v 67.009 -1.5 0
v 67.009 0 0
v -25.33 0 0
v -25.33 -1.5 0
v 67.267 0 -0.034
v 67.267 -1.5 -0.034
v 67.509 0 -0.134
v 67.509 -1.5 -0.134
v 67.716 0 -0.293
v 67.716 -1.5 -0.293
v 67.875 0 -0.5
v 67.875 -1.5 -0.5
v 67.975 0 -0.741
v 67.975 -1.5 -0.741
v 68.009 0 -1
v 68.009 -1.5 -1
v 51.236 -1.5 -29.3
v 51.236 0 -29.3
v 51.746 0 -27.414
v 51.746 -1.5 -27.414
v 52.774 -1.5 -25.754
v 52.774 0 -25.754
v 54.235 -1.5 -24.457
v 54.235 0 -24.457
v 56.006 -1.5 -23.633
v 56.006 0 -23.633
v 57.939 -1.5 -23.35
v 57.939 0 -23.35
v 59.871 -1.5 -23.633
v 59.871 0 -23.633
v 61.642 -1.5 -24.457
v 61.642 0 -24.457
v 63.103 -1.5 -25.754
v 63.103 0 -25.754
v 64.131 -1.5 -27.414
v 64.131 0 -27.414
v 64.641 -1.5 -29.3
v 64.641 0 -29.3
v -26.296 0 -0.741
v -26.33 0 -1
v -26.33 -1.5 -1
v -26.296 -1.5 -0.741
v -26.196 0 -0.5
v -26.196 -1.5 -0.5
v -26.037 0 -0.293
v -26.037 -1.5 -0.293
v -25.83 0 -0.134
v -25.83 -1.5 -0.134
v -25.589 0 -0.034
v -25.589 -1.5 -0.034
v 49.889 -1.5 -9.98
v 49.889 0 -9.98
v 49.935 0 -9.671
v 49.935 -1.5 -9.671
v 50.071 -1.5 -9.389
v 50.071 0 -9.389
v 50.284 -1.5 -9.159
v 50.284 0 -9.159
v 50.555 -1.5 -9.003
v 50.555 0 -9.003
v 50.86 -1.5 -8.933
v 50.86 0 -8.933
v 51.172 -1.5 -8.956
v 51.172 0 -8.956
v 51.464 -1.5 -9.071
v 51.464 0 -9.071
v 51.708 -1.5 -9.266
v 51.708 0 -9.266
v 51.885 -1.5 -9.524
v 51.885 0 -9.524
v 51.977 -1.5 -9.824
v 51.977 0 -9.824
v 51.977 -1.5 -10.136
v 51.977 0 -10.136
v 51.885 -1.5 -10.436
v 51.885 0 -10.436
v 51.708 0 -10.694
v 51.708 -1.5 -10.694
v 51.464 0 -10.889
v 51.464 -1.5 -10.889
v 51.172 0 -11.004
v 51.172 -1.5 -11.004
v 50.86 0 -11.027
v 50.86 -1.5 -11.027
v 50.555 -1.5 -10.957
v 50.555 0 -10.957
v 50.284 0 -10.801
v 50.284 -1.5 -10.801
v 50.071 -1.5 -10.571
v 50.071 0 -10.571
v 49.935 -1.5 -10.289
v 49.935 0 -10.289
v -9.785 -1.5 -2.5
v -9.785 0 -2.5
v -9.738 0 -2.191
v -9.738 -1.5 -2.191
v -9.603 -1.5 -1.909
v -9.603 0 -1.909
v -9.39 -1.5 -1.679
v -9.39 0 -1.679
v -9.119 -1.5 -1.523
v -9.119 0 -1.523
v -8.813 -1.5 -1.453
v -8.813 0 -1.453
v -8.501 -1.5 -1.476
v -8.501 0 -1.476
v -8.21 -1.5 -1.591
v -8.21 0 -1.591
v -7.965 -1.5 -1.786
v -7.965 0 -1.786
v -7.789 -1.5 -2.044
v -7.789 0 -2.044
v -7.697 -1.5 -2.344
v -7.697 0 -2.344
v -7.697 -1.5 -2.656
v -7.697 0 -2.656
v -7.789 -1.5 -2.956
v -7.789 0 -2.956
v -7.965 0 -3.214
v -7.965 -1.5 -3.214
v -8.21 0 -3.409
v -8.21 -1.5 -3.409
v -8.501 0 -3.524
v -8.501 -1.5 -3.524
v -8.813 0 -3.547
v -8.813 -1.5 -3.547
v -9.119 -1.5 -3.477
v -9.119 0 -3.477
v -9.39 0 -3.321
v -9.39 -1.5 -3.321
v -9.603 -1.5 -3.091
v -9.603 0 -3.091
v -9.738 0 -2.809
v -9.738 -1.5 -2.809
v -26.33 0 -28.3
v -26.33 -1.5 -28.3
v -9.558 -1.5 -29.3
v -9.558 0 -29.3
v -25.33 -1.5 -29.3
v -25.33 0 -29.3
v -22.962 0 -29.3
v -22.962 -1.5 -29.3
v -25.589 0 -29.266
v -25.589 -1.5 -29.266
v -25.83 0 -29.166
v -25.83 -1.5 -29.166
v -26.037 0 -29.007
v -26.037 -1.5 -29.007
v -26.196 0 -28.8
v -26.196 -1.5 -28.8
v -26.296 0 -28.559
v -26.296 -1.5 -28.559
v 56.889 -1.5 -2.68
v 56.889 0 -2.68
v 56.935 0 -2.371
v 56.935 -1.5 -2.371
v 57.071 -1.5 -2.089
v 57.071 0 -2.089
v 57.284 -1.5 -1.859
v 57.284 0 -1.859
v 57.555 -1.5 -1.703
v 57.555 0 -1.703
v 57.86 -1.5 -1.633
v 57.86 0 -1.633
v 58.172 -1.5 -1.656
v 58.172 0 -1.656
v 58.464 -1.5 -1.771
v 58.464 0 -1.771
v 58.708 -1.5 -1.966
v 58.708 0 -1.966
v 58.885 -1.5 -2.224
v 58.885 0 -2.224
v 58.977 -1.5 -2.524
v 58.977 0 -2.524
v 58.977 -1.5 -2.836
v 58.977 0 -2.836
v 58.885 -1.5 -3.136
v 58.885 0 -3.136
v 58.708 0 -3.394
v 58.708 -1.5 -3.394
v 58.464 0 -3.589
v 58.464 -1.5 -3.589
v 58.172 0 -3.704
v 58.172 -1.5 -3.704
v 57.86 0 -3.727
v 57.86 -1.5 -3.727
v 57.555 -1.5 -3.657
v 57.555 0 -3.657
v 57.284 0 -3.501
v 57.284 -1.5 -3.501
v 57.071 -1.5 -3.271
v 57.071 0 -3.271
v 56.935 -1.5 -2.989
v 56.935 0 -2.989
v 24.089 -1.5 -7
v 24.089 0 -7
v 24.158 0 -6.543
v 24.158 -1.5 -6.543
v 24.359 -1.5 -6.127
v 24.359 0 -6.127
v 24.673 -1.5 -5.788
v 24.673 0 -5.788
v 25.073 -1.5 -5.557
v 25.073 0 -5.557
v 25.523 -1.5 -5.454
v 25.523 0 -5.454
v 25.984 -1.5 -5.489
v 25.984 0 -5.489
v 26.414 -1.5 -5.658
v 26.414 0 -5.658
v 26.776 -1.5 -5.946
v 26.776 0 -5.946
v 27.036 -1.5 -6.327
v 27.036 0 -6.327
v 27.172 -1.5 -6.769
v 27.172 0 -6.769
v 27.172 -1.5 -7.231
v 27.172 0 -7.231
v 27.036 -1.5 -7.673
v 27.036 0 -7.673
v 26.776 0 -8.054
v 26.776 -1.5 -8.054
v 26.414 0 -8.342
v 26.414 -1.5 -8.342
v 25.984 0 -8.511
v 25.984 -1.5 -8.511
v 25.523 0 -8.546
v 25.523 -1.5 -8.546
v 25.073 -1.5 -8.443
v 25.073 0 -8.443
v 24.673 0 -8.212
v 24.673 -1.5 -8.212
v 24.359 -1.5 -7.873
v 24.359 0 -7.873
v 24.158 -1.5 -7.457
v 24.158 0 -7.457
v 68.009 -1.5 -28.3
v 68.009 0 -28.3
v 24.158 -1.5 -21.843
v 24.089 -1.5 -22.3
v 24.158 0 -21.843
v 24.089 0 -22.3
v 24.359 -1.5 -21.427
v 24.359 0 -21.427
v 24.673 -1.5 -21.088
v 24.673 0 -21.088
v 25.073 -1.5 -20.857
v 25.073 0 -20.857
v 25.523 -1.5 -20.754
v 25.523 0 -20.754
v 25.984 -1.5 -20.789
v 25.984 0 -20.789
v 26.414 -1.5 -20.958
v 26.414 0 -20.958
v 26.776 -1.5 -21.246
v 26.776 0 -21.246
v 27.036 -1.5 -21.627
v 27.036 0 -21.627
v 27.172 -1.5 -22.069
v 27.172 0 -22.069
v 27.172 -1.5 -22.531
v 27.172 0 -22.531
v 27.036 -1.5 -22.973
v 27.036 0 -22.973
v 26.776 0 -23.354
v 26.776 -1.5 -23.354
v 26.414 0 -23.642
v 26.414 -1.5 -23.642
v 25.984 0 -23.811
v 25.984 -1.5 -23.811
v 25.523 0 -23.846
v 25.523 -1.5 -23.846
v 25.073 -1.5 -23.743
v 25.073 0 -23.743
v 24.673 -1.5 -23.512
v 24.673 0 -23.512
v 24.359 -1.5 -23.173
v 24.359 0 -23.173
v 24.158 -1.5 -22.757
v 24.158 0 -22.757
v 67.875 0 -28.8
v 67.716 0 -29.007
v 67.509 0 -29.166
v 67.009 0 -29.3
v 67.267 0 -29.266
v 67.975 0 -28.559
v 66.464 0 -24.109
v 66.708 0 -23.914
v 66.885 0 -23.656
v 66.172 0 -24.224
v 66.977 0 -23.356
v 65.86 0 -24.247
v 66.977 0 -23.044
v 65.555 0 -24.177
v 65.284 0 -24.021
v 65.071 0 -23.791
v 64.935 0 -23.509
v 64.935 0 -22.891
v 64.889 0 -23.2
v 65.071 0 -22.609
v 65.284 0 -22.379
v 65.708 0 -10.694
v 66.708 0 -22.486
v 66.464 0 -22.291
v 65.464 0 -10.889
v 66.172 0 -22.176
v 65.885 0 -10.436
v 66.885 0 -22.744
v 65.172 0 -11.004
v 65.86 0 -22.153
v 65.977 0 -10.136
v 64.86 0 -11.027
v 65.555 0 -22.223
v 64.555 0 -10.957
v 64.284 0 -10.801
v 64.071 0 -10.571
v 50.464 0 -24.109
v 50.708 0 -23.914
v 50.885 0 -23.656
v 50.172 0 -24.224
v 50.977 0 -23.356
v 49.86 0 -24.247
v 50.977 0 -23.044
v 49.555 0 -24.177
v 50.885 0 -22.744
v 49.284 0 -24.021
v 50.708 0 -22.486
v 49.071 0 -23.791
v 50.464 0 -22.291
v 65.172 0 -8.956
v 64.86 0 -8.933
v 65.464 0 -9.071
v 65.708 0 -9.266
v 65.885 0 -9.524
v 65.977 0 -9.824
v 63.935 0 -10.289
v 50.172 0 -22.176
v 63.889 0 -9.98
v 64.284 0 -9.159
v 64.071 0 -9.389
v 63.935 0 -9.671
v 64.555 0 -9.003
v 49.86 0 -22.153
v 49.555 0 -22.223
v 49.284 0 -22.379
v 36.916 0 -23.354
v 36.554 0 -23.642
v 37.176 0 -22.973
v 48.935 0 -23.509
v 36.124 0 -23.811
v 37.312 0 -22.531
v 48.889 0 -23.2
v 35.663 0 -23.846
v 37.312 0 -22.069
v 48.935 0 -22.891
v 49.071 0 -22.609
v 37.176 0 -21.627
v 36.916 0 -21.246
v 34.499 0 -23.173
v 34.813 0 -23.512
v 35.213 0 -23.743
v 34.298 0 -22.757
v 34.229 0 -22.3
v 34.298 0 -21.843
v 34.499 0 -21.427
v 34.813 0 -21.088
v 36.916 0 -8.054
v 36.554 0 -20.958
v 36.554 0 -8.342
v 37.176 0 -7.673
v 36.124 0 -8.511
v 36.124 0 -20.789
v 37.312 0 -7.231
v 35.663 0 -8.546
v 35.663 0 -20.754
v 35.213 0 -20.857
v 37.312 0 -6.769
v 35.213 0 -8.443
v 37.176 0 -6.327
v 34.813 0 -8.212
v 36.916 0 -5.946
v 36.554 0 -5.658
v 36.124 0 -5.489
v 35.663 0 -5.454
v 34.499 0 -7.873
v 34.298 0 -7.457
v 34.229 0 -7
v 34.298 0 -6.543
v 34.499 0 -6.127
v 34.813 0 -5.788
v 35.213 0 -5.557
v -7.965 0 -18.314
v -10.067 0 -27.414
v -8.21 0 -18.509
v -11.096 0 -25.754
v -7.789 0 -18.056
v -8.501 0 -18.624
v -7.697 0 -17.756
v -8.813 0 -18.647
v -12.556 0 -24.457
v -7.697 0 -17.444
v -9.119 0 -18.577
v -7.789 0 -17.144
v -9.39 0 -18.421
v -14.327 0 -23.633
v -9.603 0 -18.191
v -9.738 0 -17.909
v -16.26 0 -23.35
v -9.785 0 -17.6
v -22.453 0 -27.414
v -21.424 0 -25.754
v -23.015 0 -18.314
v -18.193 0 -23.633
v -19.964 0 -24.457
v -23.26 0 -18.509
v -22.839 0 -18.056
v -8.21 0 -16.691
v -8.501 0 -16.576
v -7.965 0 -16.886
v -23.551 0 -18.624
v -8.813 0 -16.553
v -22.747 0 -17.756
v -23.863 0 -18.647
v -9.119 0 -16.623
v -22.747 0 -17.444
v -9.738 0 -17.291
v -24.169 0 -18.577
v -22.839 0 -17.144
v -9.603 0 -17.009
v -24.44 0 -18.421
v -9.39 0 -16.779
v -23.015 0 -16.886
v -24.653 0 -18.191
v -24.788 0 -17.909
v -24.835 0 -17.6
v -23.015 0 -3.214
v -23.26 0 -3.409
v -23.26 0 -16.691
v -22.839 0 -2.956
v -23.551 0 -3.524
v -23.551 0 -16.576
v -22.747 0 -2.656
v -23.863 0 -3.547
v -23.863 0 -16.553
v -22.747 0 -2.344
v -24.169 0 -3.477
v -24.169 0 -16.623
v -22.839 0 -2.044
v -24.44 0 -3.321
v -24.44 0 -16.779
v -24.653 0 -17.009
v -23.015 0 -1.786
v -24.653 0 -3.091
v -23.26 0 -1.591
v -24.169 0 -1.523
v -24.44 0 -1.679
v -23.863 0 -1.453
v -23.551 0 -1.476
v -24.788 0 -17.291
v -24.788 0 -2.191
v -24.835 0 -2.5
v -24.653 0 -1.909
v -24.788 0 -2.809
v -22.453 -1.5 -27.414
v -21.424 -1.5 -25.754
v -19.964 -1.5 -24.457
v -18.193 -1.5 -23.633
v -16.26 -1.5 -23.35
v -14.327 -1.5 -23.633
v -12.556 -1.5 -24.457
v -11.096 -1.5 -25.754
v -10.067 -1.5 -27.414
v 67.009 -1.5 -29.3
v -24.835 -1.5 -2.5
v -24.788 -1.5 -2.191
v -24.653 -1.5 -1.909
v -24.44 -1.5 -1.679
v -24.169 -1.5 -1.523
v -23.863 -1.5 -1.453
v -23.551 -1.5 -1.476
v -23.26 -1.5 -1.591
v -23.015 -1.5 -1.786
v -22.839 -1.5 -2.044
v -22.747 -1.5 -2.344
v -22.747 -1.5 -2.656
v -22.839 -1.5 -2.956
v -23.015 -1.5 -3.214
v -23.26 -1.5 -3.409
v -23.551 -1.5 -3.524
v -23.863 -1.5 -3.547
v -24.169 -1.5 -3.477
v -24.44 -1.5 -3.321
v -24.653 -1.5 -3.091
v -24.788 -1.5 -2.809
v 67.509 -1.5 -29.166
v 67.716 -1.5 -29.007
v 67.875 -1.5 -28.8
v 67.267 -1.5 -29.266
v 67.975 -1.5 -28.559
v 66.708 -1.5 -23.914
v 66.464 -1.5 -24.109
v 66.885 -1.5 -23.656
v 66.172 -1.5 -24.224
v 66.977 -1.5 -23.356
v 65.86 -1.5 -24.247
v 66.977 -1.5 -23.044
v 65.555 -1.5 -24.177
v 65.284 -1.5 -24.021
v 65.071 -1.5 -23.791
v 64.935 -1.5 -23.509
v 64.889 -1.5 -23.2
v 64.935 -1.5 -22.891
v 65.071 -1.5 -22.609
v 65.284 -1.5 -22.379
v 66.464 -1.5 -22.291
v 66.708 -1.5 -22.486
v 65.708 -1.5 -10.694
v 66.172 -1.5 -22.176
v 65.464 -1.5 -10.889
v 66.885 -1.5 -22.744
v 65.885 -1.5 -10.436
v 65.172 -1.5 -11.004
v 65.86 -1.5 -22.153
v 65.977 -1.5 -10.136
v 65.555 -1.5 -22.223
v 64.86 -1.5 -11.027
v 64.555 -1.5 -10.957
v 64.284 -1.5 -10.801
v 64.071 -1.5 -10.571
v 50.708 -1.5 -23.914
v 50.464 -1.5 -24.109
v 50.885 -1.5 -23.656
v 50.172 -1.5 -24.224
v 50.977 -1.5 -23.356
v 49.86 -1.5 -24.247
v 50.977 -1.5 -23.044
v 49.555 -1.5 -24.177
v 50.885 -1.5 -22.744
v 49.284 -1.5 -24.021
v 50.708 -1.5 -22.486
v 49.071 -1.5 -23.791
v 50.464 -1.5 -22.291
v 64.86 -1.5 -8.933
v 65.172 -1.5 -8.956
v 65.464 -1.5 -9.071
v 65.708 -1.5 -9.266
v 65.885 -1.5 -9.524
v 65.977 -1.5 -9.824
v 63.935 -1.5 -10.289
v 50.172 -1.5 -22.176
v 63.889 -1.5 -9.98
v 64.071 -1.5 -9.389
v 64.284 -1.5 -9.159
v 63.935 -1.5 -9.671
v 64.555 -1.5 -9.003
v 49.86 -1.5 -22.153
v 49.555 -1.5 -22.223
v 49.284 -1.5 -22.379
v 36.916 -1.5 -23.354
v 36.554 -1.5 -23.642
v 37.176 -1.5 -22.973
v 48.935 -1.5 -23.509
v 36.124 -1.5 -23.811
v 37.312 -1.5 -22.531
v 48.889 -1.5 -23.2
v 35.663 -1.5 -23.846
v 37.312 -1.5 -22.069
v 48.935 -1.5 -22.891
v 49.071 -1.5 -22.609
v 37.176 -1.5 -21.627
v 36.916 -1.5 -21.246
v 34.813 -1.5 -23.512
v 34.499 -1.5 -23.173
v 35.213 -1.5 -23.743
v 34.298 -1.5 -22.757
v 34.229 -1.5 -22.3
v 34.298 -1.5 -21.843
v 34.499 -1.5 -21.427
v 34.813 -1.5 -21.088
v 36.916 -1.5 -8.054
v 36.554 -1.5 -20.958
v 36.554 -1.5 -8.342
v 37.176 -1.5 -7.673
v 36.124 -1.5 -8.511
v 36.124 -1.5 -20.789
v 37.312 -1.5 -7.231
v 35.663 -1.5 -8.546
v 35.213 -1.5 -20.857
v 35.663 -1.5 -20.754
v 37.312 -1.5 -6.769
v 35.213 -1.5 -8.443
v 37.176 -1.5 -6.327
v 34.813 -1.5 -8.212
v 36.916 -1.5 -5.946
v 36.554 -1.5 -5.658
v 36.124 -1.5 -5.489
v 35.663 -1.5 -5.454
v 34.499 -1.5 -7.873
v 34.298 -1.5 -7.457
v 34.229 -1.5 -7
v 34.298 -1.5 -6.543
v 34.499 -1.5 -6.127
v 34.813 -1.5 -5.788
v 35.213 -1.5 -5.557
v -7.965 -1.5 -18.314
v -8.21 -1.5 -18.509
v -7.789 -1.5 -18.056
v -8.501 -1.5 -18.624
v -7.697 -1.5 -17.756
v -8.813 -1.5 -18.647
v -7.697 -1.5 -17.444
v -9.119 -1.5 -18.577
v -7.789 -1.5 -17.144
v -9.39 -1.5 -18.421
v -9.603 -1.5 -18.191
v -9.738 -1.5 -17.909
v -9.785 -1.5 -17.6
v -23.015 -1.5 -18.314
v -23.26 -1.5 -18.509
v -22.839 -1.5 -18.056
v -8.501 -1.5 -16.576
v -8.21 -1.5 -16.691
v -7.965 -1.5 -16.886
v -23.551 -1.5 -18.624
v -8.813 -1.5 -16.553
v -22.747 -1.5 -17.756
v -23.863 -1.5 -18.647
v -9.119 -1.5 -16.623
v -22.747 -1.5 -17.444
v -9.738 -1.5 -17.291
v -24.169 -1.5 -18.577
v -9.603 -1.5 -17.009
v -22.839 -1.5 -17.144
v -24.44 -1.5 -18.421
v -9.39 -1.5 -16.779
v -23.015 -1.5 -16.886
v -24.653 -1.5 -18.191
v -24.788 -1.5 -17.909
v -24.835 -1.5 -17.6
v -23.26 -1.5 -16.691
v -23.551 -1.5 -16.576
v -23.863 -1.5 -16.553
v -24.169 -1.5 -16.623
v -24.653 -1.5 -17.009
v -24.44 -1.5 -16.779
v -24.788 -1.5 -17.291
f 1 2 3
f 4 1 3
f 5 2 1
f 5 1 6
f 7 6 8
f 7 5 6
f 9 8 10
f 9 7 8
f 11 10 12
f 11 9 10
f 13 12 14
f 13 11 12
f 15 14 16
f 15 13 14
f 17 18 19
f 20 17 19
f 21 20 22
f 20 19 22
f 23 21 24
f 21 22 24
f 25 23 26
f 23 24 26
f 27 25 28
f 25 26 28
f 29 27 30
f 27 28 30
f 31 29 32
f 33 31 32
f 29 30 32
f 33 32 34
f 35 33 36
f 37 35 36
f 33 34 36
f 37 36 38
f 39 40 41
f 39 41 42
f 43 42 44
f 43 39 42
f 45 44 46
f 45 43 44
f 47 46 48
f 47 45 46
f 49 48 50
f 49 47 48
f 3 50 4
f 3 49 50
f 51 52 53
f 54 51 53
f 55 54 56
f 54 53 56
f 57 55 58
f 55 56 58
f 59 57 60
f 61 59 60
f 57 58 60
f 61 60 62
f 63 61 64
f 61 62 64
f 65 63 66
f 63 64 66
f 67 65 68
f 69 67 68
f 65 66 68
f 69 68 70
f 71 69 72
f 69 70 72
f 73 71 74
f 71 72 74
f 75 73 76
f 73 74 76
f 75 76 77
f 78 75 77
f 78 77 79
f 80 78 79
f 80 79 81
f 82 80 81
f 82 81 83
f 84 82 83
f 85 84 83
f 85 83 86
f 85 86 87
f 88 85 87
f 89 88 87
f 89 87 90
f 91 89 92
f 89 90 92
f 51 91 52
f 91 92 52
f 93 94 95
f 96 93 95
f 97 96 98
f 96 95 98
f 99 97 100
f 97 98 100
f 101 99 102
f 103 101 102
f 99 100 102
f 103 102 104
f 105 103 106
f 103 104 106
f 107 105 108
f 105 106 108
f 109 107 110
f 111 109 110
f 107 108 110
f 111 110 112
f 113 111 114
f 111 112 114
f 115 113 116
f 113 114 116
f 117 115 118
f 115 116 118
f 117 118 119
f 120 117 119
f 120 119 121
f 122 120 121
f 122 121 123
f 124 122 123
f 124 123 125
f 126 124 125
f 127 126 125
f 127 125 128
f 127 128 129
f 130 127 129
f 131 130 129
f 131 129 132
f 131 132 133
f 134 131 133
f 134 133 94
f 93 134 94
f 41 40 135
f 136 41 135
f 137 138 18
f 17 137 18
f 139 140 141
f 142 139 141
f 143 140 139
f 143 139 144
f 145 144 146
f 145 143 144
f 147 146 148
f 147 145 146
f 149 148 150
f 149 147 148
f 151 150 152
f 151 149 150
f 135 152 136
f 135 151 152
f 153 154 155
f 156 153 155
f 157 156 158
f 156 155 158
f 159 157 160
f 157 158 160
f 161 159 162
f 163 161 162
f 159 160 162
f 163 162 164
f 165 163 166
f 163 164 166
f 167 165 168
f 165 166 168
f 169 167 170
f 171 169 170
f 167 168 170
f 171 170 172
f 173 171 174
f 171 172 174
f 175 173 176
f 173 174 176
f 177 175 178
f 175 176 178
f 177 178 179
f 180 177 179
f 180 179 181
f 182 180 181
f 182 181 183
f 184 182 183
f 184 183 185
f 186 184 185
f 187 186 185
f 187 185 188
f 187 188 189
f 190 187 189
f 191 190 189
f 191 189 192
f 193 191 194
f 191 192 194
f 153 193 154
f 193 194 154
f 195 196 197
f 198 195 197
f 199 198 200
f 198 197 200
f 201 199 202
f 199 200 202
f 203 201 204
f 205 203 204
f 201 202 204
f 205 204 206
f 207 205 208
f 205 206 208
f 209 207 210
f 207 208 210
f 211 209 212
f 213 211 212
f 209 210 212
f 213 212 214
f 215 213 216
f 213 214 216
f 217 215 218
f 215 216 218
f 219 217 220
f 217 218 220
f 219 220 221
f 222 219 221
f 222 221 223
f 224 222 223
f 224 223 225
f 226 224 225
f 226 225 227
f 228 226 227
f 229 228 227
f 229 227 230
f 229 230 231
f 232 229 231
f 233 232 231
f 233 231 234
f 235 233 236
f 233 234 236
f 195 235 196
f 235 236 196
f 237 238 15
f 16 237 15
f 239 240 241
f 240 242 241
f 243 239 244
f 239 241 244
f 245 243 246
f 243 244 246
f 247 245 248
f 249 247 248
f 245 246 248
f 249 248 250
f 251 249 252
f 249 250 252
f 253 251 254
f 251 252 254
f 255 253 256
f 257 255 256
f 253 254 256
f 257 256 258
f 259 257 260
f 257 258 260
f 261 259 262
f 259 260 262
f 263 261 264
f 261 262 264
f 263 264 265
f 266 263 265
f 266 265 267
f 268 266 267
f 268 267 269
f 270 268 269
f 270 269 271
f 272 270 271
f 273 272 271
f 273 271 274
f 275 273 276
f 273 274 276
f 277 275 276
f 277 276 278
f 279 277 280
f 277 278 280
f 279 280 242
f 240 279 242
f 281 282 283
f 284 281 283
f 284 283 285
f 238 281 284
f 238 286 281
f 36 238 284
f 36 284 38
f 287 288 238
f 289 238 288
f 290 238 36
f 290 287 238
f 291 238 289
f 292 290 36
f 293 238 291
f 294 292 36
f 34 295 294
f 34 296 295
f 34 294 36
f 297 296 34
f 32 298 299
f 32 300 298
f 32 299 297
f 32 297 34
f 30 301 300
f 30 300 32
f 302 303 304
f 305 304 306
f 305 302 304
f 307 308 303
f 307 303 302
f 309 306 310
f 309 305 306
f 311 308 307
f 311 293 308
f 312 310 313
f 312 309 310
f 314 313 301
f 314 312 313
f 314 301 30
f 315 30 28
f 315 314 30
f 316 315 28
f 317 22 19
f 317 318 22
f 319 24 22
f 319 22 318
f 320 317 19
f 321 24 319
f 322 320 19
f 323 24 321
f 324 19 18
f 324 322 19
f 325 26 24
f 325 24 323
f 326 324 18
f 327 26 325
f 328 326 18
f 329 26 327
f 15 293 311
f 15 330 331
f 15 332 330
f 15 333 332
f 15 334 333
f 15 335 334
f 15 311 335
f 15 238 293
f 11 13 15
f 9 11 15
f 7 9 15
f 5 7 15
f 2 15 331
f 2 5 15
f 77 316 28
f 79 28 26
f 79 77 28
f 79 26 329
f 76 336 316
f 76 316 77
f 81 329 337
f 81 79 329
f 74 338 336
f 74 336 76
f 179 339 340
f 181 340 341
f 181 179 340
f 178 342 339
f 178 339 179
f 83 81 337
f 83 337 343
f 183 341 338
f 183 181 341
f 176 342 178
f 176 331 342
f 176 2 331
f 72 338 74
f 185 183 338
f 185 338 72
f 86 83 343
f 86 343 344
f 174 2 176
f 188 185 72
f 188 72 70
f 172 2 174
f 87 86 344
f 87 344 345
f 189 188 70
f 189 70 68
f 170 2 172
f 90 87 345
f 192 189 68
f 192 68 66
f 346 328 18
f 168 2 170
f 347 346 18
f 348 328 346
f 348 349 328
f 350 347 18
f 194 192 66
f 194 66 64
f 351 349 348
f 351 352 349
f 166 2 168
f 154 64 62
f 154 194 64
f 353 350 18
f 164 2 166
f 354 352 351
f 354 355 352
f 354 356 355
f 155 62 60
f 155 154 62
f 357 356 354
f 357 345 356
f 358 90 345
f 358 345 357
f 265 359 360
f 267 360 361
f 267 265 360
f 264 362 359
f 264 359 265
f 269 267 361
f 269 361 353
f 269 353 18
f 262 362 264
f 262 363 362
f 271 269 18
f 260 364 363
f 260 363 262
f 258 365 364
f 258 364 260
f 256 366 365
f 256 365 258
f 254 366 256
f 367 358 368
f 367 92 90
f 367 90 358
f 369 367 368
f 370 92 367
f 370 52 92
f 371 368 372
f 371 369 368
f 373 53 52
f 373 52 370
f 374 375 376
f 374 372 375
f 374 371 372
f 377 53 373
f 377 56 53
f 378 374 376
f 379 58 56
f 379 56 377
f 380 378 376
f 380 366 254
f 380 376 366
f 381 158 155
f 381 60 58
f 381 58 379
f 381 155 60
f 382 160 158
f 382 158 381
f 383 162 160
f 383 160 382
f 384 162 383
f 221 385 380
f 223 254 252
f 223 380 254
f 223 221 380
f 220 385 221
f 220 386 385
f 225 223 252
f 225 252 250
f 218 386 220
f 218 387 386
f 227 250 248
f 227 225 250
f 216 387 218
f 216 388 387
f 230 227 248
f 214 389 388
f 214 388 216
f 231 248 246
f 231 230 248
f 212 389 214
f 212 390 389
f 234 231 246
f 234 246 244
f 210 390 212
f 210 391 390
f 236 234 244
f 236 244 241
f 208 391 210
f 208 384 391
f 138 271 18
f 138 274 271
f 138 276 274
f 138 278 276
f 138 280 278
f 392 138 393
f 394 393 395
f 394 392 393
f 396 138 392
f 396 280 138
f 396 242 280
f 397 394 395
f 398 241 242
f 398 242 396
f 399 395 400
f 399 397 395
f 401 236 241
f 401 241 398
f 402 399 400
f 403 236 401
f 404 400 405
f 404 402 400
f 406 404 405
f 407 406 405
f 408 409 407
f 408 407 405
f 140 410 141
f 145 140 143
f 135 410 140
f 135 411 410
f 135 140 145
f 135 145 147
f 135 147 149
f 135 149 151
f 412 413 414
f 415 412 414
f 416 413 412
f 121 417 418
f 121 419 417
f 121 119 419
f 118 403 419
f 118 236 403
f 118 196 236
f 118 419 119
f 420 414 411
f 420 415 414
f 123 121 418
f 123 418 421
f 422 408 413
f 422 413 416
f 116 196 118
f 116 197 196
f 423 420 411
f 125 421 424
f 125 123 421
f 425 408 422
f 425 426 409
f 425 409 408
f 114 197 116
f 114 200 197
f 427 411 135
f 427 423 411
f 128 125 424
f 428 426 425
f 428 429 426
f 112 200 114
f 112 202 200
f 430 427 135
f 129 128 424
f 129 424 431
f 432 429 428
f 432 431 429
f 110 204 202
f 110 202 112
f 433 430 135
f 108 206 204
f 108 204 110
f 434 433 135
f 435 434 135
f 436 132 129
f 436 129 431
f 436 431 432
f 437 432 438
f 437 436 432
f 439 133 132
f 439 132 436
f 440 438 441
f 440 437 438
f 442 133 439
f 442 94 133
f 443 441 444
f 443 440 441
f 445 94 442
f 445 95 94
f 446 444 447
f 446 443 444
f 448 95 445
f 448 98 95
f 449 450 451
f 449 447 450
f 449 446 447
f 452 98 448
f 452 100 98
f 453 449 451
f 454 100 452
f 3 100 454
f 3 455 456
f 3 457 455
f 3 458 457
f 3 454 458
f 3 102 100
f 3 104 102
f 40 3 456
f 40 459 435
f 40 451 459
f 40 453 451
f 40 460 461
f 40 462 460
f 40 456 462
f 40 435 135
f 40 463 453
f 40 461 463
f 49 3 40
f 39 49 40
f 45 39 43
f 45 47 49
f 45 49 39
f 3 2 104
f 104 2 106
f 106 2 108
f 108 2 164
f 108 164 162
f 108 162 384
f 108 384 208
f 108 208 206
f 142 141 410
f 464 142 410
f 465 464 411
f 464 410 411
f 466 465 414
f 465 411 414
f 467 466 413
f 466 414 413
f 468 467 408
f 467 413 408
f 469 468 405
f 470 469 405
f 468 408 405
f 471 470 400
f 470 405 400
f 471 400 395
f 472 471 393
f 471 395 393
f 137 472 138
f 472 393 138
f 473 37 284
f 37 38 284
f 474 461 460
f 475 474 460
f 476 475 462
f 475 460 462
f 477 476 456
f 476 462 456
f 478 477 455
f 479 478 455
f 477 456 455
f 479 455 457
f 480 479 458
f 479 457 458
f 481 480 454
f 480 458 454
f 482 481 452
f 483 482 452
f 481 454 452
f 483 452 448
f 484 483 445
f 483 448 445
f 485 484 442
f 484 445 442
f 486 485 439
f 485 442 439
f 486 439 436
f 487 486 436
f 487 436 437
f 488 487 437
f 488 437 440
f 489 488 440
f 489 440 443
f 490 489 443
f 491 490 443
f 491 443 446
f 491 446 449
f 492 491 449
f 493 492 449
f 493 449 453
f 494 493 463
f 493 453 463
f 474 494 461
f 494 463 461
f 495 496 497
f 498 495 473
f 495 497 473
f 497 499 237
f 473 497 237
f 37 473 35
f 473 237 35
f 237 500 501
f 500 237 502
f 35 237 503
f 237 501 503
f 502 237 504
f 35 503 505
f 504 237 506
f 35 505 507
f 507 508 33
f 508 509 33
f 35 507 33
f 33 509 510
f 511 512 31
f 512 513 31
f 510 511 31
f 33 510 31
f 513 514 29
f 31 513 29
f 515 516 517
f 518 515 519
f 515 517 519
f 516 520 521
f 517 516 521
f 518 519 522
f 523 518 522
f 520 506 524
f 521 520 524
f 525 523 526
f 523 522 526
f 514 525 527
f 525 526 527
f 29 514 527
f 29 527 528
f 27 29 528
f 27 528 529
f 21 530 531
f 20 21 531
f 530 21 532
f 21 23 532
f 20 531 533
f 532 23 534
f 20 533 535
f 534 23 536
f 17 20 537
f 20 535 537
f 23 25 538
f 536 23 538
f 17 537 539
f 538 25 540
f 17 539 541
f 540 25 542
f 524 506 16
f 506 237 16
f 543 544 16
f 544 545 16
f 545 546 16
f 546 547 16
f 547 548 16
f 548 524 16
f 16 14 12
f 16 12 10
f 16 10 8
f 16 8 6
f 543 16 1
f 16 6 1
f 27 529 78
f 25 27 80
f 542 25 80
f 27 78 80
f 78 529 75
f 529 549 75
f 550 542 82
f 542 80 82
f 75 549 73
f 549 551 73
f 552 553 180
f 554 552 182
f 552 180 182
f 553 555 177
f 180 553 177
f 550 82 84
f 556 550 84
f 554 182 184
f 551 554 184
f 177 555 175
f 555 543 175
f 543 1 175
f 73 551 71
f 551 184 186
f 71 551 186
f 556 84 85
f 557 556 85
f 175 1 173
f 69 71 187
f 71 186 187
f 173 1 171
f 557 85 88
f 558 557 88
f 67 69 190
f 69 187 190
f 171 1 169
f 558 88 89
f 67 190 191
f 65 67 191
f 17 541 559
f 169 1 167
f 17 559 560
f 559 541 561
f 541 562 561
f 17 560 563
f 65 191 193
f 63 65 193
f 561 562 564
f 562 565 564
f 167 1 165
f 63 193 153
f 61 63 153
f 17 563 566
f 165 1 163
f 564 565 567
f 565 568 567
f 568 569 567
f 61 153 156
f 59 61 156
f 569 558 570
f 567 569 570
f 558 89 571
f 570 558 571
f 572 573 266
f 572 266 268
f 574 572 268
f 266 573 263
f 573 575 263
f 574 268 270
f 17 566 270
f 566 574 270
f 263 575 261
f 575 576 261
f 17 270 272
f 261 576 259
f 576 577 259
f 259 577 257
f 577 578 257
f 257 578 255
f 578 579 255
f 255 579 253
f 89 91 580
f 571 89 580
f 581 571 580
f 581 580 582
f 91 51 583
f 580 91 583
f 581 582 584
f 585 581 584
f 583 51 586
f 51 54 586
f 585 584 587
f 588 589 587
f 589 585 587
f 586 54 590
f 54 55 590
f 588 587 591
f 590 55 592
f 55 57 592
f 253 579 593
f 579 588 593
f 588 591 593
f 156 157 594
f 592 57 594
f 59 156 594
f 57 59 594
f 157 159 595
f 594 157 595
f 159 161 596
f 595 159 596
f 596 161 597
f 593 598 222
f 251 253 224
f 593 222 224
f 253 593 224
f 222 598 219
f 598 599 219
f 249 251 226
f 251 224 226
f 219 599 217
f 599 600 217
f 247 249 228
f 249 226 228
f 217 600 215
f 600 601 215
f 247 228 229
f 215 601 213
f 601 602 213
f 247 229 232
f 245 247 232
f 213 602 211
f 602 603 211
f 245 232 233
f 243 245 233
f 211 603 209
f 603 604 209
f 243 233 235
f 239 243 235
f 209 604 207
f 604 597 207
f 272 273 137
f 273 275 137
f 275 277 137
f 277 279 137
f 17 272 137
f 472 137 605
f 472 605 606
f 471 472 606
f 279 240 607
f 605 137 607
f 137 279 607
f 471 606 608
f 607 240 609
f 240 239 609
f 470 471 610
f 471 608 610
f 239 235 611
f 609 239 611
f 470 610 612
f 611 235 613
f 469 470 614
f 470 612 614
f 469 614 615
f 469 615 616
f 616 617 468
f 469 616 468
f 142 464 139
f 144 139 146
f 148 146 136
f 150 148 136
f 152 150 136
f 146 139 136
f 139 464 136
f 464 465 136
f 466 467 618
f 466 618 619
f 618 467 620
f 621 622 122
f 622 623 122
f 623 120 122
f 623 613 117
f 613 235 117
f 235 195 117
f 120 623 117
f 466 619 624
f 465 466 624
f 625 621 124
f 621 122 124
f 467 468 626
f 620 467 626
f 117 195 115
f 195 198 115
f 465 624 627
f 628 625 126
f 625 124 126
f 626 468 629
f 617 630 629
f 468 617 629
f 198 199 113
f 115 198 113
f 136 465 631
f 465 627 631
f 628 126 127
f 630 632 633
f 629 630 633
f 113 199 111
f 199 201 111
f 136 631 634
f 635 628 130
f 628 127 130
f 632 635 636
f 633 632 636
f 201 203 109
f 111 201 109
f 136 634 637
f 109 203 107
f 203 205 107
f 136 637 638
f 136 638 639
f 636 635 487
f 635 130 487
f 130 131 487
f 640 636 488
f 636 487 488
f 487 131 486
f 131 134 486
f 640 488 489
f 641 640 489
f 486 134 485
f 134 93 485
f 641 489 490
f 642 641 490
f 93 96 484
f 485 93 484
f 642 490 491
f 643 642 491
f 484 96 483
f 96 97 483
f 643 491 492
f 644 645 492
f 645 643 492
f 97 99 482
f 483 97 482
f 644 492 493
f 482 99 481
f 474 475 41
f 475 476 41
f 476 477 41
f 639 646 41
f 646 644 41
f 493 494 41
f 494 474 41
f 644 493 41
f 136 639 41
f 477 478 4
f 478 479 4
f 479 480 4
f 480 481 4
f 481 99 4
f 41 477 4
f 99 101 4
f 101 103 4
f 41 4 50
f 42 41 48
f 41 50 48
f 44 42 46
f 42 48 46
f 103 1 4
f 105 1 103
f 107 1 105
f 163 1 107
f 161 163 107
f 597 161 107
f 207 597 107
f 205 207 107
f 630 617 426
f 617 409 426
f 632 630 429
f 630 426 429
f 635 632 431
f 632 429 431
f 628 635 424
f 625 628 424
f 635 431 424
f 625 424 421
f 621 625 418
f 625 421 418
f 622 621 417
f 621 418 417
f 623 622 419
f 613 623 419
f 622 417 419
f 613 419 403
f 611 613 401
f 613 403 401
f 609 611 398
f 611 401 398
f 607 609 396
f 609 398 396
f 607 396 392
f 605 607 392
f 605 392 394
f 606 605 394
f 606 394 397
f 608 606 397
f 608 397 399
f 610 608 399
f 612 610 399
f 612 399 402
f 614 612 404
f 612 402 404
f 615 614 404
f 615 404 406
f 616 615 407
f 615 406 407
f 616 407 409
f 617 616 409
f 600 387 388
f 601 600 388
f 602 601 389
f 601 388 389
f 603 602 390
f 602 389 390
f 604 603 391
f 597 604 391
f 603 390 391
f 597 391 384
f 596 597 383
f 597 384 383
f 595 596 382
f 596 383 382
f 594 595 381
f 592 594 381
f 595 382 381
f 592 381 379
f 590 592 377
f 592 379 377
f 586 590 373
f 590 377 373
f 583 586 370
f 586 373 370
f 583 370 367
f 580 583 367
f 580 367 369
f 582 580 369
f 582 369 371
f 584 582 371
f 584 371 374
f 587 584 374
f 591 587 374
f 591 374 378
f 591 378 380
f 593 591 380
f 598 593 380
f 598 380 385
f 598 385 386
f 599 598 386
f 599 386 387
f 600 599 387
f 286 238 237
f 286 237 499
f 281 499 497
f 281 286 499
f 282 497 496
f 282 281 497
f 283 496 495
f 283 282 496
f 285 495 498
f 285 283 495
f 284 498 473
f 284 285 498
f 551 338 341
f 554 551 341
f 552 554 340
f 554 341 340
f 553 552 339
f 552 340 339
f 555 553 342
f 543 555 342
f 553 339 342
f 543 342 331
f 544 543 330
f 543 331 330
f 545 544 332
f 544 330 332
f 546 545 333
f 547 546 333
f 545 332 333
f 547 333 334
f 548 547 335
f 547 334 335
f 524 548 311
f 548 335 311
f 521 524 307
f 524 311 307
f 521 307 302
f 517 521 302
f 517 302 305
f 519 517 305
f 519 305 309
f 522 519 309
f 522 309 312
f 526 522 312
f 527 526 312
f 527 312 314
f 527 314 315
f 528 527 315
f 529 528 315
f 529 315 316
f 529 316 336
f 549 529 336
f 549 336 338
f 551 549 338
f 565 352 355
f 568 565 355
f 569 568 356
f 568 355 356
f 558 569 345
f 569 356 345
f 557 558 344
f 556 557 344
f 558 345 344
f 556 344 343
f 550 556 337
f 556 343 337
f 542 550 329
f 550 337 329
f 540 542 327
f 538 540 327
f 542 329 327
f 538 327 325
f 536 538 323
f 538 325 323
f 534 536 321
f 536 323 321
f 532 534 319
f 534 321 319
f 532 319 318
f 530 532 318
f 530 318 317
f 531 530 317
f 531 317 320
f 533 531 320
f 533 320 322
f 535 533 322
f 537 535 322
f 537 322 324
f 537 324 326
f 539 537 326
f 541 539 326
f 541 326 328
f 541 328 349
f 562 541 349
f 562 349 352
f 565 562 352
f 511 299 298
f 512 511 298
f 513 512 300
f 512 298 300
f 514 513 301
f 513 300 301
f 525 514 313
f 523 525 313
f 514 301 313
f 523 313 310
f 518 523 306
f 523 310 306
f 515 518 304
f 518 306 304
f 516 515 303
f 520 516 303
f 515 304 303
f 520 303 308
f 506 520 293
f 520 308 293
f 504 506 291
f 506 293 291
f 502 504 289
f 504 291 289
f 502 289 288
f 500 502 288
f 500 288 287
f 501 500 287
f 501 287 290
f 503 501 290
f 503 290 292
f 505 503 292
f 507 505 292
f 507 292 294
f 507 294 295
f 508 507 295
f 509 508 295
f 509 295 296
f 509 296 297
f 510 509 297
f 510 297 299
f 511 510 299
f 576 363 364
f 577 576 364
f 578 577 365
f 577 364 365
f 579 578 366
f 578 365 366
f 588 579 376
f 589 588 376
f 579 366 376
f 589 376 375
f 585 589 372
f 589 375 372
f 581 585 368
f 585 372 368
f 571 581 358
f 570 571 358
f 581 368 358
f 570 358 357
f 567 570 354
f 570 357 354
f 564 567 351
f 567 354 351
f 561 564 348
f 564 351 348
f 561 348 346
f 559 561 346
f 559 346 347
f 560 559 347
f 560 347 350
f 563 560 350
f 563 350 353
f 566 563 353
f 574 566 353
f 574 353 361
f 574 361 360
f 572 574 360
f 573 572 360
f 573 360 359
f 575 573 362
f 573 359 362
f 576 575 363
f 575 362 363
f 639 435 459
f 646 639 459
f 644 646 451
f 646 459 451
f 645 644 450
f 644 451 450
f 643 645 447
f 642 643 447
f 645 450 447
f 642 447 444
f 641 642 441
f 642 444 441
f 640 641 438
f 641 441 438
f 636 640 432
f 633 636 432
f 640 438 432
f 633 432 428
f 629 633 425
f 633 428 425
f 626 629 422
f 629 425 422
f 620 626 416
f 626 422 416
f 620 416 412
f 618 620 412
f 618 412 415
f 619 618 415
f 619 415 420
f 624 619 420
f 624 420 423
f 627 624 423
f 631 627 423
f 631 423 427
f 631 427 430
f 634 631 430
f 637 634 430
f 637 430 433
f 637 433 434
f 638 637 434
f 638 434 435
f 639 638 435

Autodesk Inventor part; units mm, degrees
ref_plane "YZ Plane" through (0, 0, 0) normal (1, 0, 0) x (0, 1, 0)
ref_plane "XZ Plane" through (0, 0, 0) normal (0, 1, 0) x (-1, 0, 0)
ref_plane "XY Plane" through (0, 0, 0) normal (0, 0, 1) x (1, 0, 0)
sketch "Sketch1" plane through (0, 0, 0) normal (0, 1, 0) x (-1, 0, 0)
  line L0 (-0.4496, -29.3) -> (-0.4496, 0)
  line L1 (-41.2289, 0) -> (-41.2289, -29.3)
  circle A0 centre (-49.9386, -23.2) radius 1.05
  circle A1 centre (-50.9386, -9.98) radius 1.05
  circle A2 centre (-57.9386, -2.68) radius 1.05
  circle A3 centre (-64.9386, -9.98) radius 1.05
  circle A4 centre (-65.9386, -23.2) radius 1.05
  circle A5 centre (23.785, -2.5) radius 1.05
  circle A6 centre (8.735, -2.5) radius 1.05
  circle A7 centre (23.785, -17.6) radius 1.05
  circle A8 centre (8.735, -17.6) radius 1.05
  circle A9 centre (-25.6393, -7) radius 1.55
  circle A10 centre (-35.7793, -7) radius 1.55
  circle A11 centre (-25.6393, -22.3) radius 1.55
  circle A12 centre (-35.7793, -22.3) radius 1.55
  arc A13 (-67.0086, 0) -> (-68.0086, -1) centre (-67.0086, -1) ccw
  line L2 (-67.0086, 0) -> (25.33, 0)
  line L3 (-68.0086, -28.3) -> (-68.0086, -1)
  arc A14 (-68.0086, -28.3) -> (-67.0086, -29.3) centre (-67.0086, -28.3) ccw
  line L4 (-63.885, -29.3) -> (-67.0086, -29.3)
  arc A15 (-51.9921, -29.3) -> (-63.885, -29.3) centre (-57.9386, -30.1) ccw
  line L5 (10.3136, -29.3) -> (-51.9921, -29.3)
  arc A16 (22.2064, -29.3) -> (10.3136, -29.3) centre (16.26, -30.1) ccw
  line L6 (25.33, -29.3) -> (22.2064, -29.3)
  arc A17 (25.33, -29.3) -> (26.33, -28.3) centre (25.33, -28.3) ccw
  line L7 (26.33, -1) -> (26.33, -28.3)
  arc A18 (26.33, -1) -> (25.33, 0) centre (25.33, -1) ccw
  line L8 (-41.6786, -29.3) -> (-41.6786, 0)
  line L9 (-40.7793, 0) -> (-40.7793, -29.3)
  line L10 (-0.8993, -29.3) -> (-0.8993, 0)
  line L11 (0, 0) -> (0, -29.3)
  point P0 (0, 0)
extrude "Extrusion1" add sketch "Sketch1" against normal blind 1.5
sketch "Sketch2" plane through (0, 0, 0) normal (0, 1, 0) x (1, 0, 0)
  circle A0 centre (-16.26, 30.1) radius 6.75
  circle A1 centre (57.9386, 30.1) radius 6.75
  point P0 (0, 0)
  dimension "d2" = 13.5
  dimension "d3" = 13.5
extrude "Extrusion2" cut sketch "Sketch2" against normal blind 10
properties part number "axis_22_bottom_frame"
